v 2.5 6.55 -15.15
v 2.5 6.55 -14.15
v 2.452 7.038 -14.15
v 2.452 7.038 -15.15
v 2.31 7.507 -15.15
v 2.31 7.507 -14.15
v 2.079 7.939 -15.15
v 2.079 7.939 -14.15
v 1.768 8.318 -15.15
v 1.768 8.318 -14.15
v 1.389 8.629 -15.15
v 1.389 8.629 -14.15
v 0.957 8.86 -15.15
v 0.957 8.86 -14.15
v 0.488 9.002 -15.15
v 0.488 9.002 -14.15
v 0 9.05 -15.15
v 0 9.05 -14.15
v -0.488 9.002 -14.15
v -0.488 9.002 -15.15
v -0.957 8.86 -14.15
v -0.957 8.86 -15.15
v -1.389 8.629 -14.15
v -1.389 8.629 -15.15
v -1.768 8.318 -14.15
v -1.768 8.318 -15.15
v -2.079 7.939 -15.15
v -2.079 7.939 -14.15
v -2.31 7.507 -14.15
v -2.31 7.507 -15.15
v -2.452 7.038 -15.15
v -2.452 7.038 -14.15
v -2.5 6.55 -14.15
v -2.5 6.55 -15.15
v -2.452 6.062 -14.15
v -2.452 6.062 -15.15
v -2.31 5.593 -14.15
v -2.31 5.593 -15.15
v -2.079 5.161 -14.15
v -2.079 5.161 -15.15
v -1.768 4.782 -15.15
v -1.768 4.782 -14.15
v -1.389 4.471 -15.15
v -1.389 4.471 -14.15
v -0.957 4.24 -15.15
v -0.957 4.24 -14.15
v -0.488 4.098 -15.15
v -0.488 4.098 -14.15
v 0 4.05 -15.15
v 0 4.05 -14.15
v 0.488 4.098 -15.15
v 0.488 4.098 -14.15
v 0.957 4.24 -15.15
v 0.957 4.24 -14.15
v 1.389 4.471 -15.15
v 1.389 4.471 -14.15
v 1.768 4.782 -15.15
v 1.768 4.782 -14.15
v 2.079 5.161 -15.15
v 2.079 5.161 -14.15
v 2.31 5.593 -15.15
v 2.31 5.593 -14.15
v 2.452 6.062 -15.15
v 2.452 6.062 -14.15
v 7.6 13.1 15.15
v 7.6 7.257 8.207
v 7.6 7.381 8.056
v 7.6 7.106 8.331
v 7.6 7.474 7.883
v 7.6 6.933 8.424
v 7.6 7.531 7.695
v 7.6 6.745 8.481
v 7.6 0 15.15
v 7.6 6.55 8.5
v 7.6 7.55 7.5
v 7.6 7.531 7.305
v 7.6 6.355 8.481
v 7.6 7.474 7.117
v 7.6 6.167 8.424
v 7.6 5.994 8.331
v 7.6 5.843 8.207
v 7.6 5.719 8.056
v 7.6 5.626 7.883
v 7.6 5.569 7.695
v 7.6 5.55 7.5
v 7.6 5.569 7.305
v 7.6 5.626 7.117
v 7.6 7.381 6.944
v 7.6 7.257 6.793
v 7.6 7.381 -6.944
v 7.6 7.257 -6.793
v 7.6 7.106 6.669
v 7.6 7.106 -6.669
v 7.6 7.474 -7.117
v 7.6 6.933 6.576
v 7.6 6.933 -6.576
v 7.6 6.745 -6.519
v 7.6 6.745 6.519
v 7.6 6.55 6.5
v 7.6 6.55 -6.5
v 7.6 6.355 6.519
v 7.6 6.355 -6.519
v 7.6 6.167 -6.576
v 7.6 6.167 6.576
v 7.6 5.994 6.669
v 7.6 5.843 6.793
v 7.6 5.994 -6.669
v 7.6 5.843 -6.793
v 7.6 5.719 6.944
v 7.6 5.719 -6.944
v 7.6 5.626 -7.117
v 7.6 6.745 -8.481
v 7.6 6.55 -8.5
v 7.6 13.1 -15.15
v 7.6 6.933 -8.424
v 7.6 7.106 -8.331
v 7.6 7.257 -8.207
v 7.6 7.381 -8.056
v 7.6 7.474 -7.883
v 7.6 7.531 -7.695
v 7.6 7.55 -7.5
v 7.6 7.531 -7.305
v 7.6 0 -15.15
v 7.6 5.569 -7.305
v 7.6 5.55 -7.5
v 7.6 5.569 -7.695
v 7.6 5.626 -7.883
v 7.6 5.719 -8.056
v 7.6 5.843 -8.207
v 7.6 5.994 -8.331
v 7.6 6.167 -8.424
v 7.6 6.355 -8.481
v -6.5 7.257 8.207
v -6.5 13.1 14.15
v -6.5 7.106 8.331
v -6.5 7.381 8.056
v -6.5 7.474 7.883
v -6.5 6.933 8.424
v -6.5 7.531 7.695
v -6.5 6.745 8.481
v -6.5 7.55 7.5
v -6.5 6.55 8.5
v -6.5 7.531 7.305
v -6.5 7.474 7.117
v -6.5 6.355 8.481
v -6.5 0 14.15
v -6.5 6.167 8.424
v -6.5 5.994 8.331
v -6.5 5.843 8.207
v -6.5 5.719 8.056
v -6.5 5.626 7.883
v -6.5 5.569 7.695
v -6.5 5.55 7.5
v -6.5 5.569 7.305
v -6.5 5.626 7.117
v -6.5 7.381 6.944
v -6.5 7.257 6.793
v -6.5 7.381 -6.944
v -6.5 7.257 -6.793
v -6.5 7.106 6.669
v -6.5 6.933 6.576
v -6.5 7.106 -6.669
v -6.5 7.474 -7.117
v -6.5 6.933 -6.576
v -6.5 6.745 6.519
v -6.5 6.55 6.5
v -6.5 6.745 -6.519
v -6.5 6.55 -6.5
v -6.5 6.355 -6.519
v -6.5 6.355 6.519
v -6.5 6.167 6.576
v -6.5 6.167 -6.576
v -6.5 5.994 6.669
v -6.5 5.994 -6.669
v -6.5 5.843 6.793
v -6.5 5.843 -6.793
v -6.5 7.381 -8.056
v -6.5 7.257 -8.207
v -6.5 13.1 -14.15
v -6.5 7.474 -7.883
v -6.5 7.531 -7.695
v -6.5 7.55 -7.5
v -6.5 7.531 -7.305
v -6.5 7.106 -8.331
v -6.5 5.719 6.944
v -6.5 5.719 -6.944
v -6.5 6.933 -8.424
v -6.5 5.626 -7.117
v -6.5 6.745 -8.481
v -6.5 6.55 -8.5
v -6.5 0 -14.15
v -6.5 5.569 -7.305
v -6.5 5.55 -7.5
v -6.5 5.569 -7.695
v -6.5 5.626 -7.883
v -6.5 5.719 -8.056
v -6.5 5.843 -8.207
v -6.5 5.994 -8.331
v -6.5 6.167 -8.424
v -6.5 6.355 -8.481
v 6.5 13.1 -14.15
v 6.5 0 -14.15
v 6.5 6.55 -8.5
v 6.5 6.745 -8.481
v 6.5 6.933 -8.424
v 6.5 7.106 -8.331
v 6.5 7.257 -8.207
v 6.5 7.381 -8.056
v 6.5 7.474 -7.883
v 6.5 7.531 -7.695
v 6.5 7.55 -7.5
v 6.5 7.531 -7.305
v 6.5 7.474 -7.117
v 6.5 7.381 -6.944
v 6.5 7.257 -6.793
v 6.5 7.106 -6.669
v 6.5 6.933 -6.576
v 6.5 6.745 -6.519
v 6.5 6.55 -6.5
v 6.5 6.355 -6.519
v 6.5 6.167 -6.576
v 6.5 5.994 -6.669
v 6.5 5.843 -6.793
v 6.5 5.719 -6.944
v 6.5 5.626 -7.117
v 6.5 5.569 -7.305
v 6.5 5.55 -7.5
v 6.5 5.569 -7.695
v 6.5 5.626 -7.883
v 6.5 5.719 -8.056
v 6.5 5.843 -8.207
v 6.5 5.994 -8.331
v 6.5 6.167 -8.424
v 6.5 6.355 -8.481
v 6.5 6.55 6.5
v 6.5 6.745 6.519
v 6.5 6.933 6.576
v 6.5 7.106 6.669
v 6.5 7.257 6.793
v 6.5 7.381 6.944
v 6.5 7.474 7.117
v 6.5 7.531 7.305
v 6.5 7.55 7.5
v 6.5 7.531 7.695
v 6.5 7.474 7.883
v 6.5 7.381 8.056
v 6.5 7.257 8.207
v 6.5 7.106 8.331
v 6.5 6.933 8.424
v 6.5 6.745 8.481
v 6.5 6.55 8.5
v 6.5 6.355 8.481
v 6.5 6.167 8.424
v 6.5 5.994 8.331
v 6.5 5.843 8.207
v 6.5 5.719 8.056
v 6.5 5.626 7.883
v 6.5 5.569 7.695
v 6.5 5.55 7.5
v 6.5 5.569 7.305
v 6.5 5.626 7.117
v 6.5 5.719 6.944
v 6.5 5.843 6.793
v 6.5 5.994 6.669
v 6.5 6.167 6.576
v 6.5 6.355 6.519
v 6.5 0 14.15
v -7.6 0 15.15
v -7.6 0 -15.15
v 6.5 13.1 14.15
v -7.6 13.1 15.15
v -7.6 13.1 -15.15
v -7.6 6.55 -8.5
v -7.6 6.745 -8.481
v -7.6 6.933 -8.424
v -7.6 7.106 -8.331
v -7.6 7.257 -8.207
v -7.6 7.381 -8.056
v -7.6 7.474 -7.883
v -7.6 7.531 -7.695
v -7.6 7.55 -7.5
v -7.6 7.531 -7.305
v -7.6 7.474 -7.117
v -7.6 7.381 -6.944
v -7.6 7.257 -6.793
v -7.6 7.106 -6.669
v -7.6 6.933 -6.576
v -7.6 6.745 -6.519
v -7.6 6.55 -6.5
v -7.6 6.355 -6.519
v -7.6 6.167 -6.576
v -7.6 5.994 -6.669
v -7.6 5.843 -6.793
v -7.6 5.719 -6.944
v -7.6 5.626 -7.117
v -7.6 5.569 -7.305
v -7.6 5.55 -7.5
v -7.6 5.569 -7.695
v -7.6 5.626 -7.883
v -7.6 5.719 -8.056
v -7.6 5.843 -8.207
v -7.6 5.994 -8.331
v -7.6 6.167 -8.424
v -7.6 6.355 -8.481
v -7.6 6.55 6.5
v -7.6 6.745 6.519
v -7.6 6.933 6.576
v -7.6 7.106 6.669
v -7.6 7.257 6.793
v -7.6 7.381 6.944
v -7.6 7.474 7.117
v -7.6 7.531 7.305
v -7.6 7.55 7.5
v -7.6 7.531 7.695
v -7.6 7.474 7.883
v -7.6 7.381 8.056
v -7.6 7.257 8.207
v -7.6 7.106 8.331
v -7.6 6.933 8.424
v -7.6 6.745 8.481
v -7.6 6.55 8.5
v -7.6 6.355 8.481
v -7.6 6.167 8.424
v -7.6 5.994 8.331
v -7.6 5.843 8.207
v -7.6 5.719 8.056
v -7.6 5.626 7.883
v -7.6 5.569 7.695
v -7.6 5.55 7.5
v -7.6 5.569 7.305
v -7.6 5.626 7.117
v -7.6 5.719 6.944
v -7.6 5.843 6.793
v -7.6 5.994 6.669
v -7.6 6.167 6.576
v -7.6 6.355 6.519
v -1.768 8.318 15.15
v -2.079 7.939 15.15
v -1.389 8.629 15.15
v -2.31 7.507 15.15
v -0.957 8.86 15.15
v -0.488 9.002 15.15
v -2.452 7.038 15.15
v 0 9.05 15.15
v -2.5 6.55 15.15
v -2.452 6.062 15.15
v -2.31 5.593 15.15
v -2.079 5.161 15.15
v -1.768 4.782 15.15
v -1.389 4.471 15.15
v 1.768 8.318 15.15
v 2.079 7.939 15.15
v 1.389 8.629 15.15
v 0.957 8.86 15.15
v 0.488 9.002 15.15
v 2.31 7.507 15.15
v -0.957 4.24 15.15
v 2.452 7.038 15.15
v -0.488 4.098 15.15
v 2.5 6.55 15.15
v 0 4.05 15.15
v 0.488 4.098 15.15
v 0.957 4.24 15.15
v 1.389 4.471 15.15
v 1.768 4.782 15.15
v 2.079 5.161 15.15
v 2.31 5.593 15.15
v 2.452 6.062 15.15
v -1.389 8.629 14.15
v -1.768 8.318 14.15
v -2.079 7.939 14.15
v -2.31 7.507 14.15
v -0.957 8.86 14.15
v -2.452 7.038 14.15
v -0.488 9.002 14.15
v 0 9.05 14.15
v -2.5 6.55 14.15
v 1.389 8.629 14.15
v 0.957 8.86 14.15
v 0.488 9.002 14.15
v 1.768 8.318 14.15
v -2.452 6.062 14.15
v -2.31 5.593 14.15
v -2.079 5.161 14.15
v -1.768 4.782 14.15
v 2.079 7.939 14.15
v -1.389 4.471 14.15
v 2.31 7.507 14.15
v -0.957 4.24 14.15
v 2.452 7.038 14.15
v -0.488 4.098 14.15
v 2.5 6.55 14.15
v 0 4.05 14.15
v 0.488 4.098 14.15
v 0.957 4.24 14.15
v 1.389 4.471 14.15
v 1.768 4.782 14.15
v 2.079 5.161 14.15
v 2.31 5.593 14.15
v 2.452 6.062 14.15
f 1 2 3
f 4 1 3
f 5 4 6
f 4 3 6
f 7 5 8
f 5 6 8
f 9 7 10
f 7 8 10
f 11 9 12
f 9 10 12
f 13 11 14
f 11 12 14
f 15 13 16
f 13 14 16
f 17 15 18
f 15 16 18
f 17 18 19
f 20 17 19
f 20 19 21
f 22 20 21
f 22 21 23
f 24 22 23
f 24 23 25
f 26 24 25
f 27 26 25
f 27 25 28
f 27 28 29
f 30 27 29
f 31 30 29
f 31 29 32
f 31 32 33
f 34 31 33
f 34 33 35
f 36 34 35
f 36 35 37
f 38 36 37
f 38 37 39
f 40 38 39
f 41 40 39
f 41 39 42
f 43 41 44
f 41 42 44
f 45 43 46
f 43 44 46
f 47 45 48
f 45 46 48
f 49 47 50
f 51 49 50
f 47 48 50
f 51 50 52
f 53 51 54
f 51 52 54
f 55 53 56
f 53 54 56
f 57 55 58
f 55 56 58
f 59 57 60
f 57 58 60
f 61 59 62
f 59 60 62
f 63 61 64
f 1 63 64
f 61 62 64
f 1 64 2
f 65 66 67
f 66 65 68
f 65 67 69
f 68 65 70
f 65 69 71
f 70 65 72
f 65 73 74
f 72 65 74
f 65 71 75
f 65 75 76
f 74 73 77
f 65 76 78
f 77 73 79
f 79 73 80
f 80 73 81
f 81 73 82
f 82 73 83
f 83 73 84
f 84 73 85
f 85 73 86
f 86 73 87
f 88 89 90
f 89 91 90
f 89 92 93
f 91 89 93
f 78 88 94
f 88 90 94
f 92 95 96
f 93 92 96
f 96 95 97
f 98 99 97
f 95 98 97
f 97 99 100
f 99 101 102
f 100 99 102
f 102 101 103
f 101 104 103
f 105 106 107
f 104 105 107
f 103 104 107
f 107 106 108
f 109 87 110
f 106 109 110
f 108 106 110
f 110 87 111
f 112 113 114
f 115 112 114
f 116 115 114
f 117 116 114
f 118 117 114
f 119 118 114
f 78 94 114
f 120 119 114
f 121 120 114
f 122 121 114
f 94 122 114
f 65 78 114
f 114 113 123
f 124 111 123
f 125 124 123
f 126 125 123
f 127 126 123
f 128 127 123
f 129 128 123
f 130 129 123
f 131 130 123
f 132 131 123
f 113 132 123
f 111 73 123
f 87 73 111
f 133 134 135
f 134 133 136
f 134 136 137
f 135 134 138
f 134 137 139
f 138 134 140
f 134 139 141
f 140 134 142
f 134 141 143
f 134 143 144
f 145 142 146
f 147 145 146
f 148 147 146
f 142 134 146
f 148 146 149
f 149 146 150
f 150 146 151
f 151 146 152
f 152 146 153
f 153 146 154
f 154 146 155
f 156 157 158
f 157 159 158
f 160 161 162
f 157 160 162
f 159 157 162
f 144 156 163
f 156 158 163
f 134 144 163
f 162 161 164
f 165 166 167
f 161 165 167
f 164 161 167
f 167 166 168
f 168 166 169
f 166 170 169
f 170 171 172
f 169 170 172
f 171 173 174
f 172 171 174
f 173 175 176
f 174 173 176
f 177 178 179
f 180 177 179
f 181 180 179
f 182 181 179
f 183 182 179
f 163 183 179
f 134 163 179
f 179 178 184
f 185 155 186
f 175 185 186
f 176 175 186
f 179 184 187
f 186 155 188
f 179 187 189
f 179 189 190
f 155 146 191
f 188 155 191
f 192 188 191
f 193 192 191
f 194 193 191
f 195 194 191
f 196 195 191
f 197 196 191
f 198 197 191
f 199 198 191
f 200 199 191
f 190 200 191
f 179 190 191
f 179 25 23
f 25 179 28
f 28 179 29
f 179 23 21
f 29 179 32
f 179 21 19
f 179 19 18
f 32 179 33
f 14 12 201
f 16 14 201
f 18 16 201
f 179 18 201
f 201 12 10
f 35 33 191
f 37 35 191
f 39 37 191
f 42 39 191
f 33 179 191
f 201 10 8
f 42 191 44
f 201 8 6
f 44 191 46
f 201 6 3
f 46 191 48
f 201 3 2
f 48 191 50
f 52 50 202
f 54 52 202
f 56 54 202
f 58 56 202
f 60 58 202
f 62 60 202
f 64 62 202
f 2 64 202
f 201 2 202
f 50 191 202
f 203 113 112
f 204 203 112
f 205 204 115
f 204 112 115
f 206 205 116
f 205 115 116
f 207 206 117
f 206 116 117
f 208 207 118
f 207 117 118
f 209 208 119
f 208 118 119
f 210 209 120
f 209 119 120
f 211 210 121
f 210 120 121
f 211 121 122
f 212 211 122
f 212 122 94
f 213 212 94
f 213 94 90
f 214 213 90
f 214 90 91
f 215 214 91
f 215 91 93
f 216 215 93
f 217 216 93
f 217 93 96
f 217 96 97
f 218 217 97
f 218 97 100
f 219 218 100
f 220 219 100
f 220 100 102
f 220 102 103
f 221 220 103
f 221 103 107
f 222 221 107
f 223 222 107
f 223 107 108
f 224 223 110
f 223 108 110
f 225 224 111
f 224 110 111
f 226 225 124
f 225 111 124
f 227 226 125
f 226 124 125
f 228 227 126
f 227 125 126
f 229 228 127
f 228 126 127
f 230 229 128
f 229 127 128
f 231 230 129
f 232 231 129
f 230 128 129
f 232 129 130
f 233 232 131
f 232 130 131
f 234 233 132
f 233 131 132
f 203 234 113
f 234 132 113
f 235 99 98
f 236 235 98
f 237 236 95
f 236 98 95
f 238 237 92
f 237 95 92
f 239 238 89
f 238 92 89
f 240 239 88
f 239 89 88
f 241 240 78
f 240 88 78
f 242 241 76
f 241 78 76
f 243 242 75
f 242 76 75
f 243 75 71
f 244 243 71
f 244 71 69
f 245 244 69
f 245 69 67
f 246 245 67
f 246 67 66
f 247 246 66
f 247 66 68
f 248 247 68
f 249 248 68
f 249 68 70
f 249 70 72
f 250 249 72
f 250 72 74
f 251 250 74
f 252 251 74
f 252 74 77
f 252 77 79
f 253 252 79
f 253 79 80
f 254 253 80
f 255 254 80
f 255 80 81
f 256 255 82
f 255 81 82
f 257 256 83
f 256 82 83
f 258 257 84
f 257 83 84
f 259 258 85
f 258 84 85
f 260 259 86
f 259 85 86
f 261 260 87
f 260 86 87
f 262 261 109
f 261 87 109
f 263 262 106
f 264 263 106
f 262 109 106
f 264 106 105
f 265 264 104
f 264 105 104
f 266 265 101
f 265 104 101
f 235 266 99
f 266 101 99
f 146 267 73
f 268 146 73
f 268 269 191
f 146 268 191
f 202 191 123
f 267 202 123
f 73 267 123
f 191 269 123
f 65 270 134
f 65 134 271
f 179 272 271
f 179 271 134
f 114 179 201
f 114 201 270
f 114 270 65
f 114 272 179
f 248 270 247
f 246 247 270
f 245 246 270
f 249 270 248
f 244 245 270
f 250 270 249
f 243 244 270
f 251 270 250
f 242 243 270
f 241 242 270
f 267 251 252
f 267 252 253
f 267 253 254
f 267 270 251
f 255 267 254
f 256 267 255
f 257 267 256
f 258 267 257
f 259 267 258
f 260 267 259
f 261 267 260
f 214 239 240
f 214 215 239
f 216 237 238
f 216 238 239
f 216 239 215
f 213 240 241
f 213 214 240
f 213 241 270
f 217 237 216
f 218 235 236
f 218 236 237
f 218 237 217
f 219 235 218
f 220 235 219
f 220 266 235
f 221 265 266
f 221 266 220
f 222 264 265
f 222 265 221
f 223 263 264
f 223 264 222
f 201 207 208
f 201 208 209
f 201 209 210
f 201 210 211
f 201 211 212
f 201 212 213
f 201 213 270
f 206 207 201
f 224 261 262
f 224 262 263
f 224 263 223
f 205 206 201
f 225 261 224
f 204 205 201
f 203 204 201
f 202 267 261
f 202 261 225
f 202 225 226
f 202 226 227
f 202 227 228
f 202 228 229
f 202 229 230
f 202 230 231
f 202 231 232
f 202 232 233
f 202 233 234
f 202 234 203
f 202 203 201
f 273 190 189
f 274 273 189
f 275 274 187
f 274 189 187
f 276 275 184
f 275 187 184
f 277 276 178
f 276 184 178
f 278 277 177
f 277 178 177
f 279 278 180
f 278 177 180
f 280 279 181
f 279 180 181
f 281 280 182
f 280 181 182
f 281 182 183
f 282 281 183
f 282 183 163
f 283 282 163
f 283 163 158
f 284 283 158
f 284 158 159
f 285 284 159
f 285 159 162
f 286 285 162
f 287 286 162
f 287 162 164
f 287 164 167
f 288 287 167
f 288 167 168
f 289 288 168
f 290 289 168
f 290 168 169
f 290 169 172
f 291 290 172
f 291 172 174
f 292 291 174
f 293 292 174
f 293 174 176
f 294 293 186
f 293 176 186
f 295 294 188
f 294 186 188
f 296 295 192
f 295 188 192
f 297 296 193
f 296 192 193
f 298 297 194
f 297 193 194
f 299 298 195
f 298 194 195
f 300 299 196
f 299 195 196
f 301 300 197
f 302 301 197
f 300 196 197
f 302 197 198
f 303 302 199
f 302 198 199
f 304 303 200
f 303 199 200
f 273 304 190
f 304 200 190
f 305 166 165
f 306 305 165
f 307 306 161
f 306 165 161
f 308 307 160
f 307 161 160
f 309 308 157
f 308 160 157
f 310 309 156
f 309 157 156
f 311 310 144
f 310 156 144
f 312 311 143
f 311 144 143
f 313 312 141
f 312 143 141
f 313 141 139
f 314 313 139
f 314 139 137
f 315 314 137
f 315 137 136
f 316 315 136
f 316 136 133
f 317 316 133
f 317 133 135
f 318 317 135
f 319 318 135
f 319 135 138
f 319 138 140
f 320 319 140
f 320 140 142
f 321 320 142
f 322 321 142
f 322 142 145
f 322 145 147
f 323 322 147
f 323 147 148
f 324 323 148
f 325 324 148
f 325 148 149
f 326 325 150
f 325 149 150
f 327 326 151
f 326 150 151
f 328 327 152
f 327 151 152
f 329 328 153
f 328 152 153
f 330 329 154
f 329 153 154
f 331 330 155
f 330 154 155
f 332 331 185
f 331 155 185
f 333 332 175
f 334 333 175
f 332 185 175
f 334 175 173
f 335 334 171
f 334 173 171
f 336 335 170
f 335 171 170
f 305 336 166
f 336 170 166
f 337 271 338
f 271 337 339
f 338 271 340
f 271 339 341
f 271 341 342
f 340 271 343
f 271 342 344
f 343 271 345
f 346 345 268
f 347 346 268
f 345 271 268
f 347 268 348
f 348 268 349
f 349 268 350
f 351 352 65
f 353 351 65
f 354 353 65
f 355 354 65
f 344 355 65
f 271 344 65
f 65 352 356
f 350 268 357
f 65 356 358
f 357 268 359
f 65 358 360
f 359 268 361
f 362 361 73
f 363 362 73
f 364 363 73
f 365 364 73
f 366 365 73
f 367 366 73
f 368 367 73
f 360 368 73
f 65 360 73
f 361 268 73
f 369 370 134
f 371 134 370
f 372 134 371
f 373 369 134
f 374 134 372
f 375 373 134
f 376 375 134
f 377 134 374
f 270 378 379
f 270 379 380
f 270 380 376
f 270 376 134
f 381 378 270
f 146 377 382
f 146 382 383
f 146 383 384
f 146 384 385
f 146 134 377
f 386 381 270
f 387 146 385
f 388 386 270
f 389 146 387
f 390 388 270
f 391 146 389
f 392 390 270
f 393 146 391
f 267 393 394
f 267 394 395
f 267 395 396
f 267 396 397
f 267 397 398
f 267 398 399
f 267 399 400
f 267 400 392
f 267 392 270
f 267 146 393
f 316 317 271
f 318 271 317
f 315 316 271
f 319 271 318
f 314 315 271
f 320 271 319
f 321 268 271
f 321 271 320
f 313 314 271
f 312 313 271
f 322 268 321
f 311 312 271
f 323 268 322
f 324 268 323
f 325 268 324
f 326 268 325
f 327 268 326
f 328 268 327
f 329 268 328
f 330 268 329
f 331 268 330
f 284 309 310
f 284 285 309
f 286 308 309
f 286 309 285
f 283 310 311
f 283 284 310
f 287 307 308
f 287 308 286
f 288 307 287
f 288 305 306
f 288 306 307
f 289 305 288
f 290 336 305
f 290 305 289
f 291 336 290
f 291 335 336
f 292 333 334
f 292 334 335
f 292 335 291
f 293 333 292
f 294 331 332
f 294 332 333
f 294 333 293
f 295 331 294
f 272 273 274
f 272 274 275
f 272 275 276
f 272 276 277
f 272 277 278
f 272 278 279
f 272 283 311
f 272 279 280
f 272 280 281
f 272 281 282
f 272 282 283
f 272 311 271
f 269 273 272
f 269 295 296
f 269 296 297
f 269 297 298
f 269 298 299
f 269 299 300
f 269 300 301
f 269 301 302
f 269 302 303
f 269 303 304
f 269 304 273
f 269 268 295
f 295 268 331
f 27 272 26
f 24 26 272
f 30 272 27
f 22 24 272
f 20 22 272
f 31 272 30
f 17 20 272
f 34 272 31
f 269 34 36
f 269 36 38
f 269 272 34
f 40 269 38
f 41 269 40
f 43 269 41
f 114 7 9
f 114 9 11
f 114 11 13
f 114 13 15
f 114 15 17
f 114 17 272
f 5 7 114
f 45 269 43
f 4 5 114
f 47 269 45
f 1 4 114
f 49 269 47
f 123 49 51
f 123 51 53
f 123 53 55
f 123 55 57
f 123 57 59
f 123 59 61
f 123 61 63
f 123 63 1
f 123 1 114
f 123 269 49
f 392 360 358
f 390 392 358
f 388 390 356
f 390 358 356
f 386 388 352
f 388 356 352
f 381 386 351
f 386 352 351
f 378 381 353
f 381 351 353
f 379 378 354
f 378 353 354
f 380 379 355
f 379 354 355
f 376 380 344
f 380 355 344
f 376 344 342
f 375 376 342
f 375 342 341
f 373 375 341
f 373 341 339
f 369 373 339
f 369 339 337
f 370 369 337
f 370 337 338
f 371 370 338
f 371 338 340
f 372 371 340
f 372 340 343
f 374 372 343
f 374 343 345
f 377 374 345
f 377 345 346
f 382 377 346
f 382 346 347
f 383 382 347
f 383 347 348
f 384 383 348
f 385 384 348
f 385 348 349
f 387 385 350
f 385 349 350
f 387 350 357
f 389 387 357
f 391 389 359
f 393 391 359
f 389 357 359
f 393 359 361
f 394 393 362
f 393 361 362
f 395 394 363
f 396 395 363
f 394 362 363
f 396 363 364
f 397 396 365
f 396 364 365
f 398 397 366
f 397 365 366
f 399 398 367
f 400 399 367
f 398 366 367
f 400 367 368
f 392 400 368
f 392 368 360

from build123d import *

# Parameters (mm, degrees)
SKETCH1_W           = 15.2
SKETCH1_H           = 30.3
SKETCH1_W_2         = 13
SKETCH1_H_2         = 28.3
BOSS_EXTRUDE1_DEPTH = 13.1
SKETCH2_R           = 1
CUT_EXTRUDE1_DEPTH  = 26.143040787
SKETCH3_R           = 2.5
CUT_EXTRUDE2_DEPTH  = 34.874178957


with BuildPart() as part:
    # Sketch1 → Boss-Extrude1 (new body)
    with BuildSketch(Plane(origin=(0, 0, 0), x_dir=(1, 0, 0), z_dir=(0, 1, 0))):
        Rectangle(SKETCH1_W, SKETCH1_H)
        Rectangle(SKETCH1_W_2, SKETCH1_H_2, mode=Mode.SUBTRACT)
    extrude(amount=BOSS_EXTRUDE1_DEPTH)

    # Sketch2 → Cut-Extrude1 (cut, through all)
    with BuildSketch(Plane(origin=(7.6, 0, 0), x_dir=(0, 0, -1), z_dir=(1, 0, 0))):
        with Locations((-7.5, 6.55)):
            Circle(SKETCH2_R)
        with Locations((7.5, 6.55)):
            Circle(SKETCH2_R)
    extrude(amount=-CUT_EXTRUDE1_DEPTH, mode=Mode.SUBTRACT)

    # Sketch3 → Cut-Extrude2 (cut, through all)
    with BuildSketch(Plane.XY.offset(15.15)):
        with Locations((0, 6.55)):
            Circle(SKETCH3_R)
    extrude(amount=-CUT_EXTRUDE2_DEPTH, mode=Mode.SUBTRACT)


solid = part.part
